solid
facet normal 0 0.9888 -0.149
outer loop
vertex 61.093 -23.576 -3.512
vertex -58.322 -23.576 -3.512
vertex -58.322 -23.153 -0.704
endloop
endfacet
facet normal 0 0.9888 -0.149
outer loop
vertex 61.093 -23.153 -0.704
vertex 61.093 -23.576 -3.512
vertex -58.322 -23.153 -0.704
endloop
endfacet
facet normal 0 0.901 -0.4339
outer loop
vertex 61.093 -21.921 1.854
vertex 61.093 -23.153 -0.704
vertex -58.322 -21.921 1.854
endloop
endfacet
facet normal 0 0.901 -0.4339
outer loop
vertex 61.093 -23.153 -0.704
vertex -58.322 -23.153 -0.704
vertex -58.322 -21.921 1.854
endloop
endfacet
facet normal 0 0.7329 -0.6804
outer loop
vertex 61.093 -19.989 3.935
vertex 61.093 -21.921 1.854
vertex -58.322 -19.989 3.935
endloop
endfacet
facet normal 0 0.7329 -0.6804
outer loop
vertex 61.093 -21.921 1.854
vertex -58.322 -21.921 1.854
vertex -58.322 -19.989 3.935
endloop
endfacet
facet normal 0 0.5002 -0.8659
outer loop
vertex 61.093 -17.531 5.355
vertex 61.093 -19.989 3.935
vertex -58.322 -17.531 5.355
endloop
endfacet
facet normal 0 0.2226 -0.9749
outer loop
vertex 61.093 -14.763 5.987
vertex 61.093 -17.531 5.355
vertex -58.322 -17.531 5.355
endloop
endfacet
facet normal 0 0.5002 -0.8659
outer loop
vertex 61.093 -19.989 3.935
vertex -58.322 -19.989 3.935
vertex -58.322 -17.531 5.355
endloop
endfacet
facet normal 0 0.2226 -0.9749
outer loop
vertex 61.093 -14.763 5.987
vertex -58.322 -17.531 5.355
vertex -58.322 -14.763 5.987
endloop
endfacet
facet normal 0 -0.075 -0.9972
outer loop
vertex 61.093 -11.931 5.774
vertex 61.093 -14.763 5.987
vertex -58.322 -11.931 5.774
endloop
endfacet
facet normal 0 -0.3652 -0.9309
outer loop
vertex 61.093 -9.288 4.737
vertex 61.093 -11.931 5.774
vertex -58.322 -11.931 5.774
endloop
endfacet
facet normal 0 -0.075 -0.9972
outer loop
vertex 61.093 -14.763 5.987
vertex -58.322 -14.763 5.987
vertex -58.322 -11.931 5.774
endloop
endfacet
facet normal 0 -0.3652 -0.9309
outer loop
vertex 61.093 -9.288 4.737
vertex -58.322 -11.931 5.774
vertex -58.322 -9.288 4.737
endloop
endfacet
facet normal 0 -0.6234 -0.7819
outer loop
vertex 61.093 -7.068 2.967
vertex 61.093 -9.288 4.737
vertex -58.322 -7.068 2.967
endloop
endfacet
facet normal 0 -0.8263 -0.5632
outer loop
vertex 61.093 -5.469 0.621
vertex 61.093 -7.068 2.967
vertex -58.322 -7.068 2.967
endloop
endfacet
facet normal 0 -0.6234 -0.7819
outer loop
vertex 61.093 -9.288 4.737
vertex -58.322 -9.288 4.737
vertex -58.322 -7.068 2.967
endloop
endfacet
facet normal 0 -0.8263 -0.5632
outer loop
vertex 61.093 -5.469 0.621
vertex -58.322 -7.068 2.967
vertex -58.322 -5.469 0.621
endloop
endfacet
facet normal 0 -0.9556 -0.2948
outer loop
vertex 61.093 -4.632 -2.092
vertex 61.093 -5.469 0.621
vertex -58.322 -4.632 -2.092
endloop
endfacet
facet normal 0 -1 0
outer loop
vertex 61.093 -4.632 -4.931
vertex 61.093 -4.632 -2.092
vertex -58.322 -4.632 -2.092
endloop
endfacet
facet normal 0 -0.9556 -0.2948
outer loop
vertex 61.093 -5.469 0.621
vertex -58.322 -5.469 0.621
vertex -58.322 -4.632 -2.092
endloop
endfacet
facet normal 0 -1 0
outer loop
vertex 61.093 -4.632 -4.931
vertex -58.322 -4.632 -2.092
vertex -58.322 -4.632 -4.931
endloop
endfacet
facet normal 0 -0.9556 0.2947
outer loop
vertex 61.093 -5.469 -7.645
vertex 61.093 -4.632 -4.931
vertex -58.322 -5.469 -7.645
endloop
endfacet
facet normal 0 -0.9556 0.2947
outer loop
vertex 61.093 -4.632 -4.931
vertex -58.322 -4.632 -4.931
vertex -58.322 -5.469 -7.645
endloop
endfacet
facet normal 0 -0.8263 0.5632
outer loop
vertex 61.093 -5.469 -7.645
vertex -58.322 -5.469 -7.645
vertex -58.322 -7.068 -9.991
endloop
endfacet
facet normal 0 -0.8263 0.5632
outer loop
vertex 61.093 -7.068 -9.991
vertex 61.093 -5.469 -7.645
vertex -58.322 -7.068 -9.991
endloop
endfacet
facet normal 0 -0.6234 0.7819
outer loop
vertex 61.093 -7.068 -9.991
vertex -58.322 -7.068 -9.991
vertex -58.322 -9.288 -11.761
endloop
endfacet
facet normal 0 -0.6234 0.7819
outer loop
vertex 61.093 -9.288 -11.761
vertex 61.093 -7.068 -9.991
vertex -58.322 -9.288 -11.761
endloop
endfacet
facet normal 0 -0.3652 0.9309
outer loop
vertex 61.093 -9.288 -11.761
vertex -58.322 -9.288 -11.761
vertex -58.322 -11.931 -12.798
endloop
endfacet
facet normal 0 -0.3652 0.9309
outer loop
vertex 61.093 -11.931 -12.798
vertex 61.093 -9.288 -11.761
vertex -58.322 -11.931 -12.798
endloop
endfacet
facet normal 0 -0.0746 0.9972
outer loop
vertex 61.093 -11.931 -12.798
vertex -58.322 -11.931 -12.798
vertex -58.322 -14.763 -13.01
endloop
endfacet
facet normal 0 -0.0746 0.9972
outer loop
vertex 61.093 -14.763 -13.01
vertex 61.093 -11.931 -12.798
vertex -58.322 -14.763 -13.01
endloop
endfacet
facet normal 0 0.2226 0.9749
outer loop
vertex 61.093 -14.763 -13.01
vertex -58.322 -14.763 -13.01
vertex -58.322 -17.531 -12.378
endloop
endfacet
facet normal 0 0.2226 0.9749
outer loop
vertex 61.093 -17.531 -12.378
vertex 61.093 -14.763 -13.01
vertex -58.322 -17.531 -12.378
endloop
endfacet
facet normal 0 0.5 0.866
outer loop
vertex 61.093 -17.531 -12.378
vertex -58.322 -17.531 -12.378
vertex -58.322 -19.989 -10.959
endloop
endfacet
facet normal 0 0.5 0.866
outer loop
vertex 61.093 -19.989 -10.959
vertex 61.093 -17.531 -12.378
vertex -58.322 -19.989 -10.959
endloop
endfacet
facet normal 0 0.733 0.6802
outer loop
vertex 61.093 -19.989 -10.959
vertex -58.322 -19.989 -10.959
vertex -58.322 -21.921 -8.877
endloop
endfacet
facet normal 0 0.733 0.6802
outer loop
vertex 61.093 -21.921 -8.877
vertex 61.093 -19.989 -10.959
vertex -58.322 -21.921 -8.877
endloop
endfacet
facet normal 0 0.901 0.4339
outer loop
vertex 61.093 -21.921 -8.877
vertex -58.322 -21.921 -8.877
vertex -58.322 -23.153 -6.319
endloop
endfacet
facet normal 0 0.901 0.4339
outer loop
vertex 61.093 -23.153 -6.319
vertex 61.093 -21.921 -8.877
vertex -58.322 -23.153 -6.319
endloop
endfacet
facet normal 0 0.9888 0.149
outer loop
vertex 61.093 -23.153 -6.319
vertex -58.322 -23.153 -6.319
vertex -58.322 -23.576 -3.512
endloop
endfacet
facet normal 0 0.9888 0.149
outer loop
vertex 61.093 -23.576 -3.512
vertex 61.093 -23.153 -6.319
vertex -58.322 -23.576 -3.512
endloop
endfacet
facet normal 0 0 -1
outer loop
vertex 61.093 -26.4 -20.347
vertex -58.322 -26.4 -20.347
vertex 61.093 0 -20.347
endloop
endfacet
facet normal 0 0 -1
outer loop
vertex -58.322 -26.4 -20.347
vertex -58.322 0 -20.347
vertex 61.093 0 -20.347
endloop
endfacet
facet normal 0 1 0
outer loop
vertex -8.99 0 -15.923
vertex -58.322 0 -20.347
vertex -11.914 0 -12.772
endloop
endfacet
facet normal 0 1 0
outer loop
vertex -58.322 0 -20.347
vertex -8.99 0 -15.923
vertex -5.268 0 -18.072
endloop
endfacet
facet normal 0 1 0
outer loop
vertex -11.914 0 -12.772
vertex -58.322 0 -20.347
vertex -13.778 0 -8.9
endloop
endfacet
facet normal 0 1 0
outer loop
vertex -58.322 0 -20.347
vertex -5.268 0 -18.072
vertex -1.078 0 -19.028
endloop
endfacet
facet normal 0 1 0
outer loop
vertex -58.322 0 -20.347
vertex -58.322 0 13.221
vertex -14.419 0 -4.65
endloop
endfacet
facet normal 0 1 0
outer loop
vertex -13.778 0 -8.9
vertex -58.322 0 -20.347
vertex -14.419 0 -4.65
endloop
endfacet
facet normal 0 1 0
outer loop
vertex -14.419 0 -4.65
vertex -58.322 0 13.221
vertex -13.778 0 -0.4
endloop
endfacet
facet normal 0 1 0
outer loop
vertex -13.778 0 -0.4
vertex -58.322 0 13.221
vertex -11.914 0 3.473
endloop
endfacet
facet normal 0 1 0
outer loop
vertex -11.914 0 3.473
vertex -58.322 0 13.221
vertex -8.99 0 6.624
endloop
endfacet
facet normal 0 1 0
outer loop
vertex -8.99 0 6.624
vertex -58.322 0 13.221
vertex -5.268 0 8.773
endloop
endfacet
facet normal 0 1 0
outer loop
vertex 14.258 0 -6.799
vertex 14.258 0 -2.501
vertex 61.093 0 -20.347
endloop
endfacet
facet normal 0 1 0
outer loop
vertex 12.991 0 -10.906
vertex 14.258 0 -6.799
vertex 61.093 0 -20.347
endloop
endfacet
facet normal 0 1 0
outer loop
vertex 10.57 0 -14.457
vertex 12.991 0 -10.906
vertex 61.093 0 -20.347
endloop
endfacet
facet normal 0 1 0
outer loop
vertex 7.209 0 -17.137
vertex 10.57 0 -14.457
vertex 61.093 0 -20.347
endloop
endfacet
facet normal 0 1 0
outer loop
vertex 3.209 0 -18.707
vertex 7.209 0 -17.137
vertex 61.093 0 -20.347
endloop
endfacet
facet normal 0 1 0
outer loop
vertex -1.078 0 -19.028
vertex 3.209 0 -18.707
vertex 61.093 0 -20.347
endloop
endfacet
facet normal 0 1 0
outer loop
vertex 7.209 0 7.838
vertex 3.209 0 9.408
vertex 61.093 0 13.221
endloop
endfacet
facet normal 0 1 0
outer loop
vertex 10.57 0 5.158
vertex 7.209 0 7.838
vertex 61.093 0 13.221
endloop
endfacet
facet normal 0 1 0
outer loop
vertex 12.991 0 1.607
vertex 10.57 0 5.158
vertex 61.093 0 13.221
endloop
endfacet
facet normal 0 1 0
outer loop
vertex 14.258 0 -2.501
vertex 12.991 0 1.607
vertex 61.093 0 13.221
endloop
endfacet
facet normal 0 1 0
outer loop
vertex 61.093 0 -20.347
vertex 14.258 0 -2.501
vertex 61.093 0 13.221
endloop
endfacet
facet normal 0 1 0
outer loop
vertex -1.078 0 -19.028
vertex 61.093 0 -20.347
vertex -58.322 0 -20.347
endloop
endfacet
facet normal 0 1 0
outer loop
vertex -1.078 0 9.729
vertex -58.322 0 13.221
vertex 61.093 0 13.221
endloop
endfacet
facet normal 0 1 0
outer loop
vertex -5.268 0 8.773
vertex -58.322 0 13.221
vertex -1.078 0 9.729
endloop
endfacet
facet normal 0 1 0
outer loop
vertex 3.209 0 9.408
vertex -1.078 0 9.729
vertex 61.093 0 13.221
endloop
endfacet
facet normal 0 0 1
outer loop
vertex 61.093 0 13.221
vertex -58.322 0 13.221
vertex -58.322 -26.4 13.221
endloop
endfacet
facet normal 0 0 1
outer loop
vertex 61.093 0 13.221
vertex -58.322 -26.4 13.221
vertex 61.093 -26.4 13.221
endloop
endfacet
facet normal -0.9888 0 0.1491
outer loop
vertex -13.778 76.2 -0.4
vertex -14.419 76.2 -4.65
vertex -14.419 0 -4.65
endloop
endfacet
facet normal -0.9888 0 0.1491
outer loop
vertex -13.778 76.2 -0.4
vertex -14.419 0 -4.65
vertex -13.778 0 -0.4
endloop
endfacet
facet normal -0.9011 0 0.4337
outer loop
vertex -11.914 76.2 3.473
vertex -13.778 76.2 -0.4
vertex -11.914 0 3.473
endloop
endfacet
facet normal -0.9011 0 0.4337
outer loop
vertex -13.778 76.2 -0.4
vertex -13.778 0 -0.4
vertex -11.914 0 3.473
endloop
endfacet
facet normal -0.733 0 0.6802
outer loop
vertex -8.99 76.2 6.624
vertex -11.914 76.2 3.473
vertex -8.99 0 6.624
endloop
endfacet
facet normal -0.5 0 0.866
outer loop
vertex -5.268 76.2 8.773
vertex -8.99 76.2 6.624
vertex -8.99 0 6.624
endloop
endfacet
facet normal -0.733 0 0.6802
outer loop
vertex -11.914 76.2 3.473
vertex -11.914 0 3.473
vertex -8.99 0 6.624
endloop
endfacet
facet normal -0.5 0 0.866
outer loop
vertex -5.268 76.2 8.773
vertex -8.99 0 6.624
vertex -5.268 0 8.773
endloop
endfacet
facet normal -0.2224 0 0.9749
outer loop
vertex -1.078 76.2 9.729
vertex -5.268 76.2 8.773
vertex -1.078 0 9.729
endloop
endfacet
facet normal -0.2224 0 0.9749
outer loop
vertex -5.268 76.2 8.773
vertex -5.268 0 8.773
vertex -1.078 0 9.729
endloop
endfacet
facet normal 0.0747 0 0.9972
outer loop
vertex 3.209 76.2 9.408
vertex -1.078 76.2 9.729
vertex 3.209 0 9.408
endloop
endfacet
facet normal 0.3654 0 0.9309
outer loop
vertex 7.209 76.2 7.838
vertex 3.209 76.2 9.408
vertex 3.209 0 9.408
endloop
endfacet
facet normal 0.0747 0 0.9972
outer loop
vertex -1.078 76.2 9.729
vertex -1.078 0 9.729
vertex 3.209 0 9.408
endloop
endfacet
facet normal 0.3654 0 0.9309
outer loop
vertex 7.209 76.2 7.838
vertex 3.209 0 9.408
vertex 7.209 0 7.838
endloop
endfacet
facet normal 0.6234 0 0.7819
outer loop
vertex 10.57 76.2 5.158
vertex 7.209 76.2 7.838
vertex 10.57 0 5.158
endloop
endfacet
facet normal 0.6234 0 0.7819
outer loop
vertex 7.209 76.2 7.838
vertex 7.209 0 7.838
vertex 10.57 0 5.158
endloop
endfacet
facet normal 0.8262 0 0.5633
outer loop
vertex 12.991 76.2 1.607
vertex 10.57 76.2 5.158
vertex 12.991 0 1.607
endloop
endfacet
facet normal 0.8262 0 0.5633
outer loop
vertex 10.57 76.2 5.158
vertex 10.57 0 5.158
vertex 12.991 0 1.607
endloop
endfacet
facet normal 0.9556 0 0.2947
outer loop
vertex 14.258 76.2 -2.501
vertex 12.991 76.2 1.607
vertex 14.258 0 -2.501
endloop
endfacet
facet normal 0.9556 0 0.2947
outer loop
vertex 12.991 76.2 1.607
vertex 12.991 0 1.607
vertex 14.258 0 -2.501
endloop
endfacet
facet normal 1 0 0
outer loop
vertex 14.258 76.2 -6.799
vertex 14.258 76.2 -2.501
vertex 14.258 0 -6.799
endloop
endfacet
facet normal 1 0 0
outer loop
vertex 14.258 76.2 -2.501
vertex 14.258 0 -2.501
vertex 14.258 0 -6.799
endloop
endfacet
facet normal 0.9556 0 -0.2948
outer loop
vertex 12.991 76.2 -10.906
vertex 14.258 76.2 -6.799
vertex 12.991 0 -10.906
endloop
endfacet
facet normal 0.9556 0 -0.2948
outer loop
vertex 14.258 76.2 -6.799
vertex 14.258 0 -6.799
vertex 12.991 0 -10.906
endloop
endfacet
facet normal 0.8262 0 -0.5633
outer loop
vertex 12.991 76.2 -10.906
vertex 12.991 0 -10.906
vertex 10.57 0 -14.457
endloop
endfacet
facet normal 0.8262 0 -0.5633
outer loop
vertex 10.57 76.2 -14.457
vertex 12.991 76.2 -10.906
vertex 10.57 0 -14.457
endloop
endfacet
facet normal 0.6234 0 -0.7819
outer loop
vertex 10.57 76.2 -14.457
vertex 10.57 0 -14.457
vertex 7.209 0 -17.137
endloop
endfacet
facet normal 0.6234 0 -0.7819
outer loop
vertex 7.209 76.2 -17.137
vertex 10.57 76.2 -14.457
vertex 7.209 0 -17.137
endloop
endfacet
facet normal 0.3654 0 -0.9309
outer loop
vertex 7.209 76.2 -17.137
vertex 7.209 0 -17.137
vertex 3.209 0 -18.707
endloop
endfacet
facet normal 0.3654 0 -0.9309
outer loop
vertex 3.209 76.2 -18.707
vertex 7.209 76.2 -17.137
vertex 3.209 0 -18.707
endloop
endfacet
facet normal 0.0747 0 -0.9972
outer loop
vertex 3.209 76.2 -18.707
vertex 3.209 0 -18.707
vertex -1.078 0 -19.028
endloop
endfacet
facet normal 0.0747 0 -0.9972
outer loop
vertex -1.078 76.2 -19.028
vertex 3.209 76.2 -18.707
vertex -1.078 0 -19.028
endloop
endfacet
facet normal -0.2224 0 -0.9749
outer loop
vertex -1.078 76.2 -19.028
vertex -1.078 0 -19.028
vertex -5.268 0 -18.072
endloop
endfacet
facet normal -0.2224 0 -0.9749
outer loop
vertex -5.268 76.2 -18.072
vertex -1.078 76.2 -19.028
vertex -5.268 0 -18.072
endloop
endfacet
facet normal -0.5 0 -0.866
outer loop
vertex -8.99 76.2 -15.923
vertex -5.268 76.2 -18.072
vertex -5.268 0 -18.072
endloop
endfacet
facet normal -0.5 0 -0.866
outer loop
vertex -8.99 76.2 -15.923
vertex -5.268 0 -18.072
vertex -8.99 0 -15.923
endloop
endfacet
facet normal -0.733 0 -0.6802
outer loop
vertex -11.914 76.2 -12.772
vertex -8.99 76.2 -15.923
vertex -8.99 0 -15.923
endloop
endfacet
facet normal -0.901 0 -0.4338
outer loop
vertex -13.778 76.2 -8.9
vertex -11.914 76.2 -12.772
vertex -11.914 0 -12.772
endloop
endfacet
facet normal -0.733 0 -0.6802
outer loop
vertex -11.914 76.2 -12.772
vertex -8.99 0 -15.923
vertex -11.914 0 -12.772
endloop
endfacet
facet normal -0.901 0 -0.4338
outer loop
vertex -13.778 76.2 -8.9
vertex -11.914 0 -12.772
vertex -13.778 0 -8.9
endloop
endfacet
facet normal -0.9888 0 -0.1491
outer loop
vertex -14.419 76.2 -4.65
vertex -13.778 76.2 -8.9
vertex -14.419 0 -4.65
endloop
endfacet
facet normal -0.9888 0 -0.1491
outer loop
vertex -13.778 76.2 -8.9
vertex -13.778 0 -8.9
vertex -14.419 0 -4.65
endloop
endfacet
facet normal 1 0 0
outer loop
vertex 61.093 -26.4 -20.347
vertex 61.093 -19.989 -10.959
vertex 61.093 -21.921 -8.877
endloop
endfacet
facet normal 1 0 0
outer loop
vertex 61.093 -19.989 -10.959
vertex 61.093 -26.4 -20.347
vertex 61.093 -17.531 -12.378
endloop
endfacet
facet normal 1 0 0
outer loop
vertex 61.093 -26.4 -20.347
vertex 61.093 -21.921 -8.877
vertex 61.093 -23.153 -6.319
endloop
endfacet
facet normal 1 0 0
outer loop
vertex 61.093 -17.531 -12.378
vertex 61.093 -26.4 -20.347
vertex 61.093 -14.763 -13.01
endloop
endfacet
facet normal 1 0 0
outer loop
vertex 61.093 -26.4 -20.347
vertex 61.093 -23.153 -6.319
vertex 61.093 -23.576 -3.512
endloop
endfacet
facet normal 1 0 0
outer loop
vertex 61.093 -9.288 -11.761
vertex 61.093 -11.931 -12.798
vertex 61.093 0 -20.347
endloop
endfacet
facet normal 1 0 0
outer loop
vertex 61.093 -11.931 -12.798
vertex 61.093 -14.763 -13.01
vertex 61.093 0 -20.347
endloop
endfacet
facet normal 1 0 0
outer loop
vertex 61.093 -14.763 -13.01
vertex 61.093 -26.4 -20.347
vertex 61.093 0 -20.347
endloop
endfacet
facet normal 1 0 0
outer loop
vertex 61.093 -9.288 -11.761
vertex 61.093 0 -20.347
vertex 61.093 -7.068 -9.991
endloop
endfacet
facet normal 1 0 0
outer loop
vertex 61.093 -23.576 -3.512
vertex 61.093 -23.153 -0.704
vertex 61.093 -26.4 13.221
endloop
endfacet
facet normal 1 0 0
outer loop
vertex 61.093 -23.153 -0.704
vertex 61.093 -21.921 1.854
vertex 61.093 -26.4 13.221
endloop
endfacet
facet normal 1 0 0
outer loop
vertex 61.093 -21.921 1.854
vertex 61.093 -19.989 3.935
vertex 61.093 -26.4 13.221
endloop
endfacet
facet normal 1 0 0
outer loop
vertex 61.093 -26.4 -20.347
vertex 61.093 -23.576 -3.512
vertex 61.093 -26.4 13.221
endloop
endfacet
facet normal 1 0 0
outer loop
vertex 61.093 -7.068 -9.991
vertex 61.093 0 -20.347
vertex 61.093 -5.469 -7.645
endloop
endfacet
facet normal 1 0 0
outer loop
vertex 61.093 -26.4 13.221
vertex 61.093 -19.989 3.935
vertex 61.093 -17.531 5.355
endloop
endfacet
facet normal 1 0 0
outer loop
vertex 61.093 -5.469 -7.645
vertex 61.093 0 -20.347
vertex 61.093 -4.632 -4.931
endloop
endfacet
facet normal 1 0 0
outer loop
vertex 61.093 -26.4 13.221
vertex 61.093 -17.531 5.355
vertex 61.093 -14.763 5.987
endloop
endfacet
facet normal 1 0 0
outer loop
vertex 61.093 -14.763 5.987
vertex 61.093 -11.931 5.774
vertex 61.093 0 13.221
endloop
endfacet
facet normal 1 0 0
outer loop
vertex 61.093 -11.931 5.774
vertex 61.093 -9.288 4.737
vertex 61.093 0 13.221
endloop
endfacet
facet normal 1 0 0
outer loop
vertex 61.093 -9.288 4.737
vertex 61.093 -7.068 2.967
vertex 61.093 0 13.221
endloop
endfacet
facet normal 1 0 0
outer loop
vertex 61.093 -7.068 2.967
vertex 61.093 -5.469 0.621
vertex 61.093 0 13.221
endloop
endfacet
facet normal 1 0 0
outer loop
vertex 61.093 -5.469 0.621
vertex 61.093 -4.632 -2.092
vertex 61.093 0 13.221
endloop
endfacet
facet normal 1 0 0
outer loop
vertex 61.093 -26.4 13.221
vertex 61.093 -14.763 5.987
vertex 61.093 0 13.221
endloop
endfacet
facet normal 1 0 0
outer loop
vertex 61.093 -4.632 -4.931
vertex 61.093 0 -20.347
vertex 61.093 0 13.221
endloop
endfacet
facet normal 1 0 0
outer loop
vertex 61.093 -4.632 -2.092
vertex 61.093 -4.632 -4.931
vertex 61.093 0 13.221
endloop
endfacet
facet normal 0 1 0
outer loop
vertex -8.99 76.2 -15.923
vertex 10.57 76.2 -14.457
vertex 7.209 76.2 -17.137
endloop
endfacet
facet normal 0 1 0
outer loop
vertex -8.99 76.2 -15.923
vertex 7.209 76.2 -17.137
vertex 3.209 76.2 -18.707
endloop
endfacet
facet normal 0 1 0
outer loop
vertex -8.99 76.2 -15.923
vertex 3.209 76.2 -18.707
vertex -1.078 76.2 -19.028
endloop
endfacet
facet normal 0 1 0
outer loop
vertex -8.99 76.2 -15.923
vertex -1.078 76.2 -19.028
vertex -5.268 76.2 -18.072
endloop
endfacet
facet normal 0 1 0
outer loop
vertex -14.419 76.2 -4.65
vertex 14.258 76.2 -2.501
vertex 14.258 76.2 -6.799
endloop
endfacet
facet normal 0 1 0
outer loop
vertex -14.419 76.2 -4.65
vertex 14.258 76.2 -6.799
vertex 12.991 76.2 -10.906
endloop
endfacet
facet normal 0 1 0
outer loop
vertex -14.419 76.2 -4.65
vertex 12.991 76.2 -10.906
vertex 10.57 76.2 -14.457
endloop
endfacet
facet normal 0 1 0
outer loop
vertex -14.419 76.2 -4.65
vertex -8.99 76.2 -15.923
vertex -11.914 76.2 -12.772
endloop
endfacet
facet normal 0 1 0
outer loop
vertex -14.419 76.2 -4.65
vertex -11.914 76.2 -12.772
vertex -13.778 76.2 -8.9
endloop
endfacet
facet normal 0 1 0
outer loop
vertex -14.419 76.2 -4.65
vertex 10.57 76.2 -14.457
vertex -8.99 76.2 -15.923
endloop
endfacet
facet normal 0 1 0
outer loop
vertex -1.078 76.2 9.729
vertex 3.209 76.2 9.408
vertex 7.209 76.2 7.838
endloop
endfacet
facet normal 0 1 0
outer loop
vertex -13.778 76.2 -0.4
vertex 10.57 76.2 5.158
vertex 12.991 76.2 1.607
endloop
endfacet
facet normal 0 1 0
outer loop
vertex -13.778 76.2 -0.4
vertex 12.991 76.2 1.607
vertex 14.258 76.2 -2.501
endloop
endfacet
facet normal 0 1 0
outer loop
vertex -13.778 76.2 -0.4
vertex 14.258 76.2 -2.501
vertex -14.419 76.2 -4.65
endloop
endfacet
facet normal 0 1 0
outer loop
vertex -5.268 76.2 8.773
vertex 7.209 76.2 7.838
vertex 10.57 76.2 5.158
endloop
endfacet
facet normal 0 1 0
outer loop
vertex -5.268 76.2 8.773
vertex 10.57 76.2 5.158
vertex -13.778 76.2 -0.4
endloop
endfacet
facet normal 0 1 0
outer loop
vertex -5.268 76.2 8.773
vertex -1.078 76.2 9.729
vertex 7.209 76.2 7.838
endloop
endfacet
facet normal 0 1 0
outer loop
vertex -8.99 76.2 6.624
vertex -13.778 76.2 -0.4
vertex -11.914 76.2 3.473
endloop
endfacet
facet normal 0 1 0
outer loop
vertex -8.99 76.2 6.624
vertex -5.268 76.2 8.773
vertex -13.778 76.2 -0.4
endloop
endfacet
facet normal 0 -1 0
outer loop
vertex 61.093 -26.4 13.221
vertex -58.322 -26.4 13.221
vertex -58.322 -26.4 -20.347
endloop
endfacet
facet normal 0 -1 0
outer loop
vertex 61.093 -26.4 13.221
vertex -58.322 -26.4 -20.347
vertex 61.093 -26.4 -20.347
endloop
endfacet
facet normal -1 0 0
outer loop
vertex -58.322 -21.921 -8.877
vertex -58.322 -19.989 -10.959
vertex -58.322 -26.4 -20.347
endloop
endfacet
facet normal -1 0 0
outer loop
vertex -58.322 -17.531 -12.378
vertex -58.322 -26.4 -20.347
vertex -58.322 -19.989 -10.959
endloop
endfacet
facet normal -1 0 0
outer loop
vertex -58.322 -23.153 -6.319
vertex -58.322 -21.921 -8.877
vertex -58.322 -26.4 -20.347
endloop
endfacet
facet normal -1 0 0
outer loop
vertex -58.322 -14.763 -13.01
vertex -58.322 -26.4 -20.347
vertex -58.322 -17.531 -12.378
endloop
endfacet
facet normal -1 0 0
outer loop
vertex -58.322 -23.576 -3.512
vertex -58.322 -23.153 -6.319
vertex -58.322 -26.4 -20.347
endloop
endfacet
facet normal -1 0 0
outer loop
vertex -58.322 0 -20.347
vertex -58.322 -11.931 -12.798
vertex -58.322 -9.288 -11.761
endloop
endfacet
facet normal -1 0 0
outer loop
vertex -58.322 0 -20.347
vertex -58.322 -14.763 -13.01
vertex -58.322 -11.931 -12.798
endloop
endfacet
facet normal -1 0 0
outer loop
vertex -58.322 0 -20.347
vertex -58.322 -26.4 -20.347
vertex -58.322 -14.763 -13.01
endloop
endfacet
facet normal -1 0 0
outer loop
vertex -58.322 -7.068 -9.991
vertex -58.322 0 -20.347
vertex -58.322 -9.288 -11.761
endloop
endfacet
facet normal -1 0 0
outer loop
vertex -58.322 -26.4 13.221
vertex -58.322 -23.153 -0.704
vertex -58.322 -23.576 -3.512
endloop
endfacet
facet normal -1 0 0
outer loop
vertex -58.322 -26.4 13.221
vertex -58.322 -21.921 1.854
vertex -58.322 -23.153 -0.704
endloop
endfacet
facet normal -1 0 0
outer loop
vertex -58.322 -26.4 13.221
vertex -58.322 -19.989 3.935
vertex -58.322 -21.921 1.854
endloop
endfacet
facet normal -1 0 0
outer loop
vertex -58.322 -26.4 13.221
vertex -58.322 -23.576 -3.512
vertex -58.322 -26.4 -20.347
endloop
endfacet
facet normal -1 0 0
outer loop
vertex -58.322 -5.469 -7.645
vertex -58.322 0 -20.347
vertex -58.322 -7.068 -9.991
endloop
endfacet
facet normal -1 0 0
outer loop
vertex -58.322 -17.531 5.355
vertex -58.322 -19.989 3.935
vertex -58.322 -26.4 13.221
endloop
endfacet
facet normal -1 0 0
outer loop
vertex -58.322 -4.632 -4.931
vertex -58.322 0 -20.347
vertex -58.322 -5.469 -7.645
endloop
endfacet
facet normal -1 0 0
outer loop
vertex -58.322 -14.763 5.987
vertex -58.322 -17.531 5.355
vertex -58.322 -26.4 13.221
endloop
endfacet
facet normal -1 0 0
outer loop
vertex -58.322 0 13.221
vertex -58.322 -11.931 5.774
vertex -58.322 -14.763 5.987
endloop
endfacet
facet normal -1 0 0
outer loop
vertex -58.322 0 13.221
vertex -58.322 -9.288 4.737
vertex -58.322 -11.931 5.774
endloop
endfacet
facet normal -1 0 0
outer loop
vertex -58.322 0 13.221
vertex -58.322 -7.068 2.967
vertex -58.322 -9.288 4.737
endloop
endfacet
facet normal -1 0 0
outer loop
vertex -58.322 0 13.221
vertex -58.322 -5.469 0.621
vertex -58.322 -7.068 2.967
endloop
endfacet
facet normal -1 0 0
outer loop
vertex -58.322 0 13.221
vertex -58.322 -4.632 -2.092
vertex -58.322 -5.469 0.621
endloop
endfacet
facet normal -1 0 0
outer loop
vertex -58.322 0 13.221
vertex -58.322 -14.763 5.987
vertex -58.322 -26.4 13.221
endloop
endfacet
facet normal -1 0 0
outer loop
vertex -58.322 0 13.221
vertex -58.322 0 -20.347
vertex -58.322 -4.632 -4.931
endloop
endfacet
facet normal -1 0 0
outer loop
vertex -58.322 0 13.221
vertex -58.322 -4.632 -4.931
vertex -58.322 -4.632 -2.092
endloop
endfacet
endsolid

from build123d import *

# Parameters (mm, degrees)
F0_W      = 119.415596
F0_H      = 33.568412
F1_DEPTH  = 1
F1_FACE_W = 119.415596
F1_FACE_H = 33.568412
F2_DEPTH  = 25.4
F4_D      = 19.05
F5_R      = 14.418988
F6_DEPTH  = 76.2


with BuildPart() as f1:
    # F0 (on Front) → F1 (new body)
    with BuildSketch(Plane.XZ):
        with Locations((1.385562, -3.563076)):
            Rectangle(F0_W, F0_H)
    extrude(amount=F1_DEPTH)

    # F1_face (on face) → F2 (join)
    with BuildSketch(Plane(origin=(1.385562, -1, -3.563076), x_dir=(1, 0, 0), z_dir=(0, -1, 0))):
        Rectangle(F1_FACE_W, F1_FACE_H)
    extrude(amount=F2_DEPTH)

    # F4 (through all)
    with Locations(Plane.YZ.offset(61.09336)):
        with Locations((-14.050731, -3.511861)):
            Hole(F4_D / 2)

    # F5 (on face) → F6 (join)
    with BuildSketch(Plane(origin=(0, 0, 0), x_dir=(-1, 0, 0), z_dir=(0, 1, 0))):
        with Locations((0, -4.649602)):
            Circle(F5_R)
    extrude(amount=F6_DEPTH)


solid = f1.part
